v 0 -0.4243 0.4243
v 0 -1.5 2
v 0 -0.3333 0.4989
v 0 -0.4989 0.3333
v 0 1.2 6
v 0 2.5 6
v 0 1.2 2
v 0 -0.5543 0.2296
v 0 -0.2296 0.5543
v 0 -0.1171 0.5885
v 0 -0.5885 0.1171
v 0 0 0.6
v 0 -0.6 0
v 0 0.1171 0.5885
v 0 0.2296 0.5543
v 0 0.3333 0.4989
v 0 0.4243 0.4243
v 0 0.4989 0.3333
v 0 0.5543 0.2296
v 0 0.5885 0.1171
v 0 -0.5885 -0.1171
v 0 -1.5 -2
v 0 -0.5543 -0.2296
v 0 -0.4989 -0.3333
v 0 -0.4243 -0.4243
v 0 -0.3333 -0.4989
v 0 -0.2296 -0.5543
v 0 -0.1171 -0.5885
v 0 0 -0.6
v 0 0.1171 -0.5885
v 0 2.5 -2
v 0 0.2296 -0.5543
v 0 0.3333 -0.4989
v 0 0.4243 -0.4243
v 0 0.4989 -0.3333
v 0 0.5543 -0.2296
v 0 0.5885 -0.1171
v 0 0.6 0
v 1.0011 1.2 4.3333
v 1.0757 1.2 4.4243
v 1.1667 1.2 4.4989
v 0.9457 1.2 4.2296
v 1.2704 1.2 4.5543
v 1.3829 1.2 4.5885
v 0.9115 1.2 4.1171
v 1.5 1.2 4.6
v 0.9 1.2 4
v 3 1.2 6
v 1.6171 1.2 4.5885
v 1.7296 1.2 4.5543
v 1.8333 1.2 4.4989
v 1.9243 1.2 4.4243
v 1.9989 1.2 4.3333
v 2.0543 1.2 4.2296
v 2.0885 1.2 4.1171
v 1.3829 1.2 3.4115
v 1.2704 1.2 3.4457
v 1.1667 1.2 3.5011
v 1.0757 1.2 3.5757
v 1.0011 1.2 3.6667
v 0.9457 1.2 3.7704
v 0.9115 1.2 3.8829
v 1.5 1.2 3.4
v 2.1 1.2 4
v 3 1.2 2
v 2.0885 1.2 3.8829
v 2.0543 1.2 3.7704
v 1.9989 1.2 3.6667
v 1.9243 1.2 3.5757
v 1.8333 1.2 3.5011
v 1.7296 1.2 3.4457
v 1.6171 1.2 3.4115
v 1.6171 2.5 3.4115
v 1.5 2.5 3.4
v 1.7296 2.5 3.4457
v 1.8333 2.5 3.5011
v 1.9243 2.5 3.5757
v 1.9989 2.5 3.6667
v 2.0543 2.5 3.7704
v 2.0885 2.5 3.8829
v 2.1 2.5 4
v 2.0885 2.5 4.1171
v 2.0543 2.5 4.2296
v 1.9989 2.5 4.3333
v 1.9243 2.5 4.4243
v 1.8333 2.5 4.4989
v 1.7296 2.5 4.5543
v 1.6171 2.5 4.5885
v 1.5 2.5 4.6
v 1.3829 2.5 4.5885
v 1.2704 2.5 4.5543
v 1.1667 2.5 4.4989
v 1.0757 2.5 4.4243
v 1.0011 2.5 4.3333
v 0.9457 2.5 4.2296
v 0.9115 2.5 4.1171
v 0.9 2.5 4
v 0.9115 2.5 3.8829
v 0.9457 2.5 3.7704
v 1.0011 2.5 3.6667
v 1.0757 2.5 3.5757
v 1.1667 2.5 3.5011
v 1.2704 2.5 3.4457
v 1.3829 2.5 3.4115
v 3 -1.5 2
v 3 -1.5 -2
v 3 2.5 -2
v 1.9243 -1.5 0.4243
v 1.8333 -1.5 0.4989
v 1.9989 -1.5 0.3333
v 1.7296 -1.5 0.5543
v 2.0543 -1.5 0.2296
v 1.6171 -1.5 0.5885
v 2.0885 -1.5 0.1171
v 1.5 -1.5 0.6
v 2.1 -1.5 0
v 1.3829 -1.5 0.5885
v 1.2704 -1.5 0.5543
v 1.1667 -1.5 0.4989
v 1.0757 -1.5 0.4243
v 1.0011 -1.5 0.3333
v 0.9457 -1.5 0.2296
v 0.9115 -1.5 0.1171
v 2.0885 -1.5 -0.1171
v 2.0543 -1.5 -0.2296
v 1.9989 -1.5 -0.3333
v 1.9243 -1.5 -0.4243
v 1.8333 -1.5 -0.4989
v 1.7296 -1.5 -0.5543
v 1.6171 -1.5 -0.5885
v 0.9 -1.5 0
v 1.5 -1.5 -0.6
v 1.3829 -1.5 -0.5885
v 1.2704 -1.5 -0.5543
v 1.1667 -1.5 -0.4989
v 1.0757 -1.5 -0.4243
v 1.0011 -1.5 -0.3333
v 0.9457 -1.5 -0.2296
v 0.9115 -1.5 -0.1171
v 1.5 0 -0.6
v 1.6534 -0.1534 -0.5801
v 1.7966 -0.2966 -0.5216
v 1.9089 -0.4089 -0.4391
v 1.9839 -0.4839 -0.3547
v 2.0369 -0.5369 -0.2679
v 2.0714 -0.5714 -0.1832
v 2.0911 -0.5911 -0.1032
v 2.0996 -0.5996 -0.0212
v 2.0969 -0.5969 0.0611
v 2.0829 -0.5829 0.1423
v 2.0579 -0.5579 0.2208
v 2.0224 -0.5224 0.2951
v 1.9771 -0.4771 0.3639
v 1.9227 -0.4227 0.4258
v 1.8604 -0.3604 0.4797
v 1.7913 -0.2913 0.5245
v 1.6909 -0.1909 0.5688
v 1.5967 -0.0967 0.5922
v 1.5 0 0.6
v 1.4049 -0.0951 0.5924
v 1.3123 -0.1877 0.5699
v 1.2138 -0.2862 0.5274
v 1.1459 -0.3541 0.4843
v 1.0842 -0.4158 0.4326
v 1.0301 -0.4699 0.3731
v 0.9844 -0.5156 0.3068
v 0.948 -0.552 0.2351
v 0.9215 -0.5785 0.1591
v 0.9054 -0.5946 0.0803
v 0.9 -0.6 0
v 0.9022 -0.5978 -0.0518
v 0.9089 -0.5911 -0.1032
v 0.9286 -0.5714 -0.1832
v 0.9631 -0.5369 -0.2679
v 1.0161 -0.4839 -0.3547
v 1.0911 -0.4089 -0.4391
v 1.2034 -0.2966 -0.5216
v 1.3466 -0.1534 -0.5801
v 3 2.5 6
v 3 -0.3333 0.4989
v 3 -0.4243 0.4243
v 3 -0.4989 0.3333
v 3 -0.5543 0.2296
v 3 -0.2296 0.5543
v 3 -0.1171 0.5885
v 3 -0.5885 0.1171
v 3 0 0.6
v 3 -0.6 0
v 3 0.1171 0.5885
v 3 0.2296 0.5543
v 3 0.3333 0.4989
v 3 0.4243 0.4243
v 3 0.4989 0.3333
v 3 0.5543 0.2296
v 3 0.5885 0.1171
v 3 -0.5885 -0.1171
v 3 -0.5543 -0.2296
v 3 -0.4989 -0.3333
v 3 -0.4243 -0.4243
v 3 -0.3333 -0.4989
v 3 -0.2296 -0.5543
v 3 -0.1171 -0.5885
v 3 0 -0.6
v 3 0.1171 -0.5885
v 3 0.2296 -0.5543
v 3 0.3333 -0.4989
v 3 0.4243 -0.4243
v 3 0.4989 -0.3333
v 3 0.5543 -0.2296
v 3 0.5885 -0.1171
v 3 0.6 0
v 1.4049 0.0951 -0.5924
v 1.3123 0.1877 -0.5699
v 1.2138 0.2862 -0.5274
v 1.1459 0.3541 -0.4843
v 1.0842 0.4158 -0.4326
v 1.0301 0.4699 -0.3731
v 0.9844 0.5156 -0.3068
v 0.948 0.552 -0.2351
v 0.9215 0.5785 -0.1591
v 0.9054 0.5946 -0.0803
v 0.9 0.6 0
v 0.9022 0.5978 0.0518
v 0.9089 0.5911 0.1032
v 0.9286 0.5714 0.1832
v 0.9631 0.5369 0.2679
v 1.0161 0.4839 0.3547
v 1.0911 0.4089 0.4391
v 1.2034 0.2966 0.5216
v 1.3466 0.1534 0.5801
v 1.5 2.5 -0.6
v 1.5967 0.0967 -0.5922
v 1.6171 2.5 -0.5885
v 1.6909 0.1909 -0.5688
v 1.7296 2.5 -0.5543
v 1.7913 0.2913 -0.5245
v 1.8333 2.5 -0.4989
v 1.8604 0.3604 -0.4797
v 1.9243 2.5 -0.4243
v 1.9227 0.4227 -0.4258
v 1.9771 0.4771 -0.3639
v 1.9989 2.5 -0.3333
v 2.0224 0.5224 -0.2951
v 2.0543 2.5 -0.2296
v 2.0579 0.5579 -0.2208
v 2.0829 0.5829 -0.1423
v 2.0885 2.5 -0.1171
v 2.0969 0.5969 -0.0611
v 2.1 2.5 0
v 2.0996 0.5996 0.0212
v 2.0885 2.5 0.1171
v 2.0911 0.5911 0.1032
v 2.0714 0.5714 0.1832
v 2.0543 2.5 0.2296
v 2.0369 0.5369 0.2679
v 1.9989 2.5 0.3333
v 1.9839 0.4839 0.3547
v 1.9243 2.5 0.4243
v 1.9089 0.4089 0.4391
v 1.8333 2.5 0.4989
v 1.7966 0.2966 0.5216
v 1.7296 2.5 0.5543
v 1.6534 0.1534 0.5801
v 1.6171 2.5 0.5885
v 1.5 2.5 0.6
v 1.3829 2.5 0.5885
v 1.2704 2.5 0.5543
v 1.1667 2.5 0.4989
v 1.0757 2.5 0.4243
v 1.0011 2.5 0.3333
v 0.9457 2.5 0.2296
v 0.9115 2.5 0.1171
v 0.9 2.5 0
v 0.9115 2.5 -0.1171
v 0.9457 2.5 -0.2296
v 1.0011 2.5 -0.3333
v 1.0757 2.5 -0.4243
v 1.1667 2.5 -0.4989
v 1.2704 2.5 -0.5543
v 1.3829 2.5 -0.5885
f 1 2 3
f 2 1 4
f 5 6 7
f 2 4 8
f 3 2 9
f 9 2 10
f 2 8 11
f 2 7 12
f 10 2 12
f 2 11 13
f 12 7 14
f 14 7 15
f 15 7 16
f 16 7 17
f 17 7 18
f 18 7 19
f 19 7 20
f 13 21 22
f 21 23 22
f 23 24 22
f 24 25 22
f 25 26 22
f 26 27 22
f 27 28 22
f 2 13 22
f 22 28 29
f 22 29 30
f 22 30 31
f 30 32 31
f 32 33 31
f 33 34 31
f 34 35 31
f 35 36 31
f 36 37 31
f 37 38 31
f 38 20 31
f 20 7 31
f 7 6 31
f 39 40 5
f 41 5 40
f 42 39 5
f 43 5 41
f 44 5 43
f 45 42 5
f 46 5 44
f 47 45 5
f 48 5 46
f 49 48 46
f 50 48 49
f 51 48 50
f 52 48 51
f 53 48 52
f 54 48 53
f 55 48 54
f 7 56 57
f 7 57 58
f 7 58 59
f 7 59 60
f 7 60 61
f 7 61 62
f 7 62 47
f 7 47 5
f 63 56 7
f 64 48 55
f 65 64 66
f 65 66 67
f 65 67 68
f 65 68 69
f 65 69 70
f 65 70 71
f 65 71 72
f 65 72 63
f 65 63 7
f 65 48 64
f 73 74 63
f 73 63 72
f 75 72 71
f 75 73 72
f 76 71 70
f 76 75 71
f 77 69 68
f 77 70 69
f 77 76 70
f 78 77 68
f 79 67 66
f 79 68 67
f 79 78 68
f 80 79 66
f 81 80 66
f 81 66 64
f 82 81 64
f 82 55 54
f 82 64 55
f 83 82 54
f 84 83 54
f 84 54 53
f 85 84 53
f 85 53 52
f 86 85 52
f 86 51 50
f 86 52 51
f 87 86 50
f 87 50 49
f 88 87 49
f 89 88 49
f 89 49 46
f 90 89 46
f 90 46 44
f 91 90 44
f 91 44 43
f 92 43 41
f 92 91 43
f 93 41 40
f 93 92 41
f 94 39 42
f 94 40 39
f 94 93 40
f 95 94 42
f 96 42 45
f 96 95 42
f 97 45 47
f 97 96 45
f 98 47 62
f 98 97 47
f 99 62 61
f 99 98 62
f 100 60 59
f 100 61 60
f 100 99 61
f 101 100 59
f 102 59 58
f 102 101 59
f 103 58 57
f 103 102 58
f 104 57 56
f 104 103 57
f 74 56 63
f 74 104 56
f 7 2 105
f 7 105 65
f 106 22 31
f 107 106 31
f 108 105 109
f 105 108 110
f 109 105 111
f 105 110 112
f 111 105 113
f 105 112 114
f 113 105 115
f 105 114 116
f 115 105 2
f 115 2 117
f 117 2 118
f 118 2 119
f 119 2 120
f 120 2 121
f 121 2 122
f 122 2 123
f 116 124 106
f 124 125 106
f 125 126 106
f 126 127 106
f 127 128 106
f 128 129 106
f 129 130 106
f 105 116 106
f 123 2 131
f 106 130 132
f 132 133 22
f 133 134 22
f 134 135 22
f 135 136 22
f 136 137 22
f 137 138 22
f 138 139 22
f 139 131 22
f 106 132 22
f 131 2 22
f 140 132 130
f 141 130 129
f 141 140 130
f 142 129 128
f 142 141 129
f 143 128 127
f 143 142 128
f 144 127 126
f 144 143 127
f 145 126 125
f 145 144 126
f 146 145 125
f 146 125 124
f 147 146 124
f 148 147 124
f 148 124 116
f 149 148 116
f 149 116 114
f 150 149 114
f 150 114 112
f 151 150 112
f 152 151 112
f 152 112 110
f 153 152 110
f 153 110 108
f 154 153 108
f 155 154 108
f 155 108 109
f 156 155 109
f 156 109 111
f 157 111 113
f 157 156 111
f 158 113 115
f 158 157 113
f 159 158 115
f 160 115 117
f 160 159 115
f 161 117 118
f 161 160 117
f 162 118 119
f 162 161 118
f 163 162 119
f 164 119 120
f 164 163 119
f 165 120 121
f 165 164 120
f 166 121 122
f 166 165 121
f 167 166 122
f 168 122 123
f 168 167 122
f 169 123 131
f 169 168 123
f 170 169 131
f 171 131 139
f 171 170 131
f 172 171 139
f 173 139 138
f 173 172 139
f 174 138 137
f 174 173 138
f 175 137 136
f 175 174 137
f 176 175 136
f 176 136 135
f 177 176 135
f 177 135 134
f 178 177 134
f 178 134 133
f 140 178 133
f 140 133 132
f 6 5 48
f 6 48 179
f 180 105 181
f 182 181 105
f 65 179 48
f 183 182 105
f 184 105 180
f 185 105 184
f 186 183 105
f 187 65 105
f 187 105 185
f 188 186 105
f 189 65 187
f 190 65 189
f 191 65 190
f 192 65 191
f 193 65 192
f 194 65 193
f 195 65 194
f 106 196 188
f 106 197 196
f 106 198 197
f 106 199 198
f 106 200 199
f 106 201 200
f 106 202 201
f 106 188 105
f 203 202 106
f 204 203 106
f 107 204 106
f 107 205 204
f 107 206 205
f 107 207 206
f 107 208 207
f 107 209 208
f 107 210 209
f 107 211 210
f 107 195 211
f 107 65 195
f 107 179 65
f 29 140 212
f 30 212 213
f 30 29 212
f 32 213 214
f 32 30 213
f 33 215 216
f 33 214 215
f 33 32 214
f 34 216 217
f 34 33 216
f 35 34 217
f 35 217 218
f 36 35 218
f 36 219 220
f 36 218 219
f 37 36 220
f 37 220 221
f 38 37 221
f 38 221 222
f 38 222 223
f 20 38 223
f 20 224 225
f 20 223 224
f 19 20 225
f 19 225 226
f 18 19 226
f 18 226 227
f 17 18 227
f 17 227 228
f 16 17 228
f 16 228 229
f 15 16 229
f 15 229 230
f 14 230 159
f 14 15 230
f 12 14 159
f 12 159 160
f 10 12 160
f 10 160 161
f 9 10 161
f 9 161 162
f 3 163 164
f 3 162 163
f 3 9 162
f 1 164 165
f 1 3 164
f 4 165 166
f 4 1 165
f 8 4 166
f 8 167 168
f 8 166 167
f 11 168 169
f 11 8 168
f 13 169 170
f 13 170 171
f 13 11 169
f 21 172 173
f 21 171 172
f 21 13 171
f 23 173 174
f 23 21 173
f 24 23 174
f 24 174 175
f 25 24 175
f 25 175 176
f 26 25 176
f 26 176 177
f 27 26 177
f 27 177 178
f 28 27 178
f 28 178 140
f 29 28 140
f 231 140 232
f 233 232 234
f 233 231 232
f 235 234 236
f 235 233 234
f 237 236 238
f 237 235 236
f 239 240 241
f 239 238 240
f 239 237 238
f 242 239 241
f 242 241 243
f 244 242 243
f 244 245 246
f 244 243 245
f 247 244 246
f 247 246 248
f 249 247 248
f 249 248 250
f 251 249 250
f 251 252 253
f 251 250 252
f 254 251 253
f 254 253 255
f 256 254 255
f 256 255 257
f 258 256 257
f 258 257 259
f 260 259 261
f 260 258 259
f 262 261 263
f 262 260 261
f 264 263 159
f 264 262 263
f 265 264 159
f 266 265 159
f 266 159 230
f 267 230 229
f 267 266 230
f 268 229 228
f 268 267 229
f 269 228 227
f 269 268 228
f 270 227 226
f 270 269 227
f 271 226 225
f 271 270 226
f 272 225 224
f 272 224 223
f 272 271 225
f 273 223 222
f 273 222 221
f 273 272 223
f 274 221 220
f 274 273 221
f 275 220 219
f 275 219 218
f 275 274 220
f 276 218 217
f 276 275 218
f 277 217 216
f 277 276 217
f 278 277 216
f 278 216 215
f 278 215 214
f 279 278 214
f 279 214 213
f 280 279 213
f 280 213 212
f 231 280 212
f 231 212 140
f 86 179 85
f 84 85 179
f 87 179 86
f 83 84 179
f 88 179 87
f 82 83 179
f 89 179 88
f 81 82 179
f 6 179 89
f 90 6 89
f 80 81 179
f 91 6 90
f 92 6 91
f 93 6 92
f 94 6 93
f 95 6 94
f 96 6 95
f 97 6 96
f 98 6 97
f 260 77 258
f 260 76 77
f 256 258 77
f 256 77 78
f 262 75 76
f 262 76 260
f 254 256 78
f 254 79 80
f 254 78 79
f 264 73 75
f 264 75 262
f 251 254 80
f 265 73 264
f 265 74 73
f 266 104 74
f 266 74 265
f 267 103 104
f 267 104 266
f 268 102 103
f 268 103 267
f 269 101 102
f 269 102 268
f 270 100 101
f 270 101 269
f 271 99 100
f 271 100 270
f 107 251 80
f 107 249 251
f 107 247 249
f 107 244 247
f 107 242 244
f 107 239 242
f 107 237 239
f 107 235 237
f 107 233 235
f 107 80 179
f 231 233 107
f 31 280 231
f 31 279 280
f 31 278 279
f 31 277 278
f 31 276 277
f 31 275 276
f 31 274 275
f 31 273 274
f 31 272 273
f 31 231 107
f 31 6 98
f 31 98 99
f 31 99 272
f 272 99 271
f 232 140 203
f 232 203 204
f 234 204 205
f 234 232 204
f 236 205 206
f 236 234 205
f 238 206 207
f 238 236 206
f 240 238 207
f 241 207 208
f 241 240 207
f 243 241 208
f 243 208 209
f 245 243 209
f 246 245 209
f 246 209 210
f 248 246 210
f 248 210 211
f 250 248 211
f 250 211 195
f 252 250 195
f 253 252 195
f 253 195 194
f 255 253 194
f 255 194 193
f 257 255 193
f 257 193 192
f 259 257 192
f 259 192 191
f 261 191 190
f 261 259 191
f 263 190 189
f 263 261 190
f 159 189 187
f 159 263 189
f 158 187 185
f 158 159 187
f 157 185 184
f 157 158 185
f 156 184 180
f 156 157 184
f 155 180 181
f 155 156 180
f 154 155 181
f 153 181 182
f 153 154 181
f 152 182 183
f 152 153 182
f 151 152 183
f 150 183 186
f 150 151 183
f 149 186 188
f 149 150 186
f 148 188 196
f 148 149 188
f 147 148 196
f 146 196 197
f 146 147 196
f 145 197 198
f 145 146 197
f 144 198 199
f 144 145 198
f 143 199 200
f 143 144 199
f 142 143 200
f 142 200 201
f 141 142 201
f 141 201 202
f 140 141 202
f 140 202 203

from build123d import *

# Parameters (mm, degrees)
SKETCH_1_W               = 4
SKETCH_1_H               = 2.5
SKETCH_1_R               = 0.6
SKETCH_1_H_2             = 1.5
EXTRUDE_1_DEPTH          = 3
CUT_EXTRUDE_1_DEPTH      = 8.158910532
CUT_EXTRUDE_1_DEPTH_BACK = 8.158910532
SKETCH_3_R               = 0.6
SKETCH_5_W               = 4
SKETCH_5_H               = 0.2
CUT_EXTRUDE_2_DEPTH      = 8.158910532


with BuildPart() as part:
    # 草图1 → 凸台-拉伸1 (new body)
    # profile 1 of 3: a face of its own
    with BuildSketch(Plane(origin=(0, 0, 0), x_dir=(0, 0, -1), z_dir=(1, 0, 0))):
        with Locations((0, -0.25)):
            Rectangle(SKETCH_1_W, SKETCH_1_H)
        Circle(SKETCH_1_R, mode=Mode.SUBTRACT)
    # profile 2 of 3: a face of its own
    with BuildSketch(Plane(origin=(0, 0, 0), x_dir=(0, 0, -1), z_dir=(1, 0, 0))):
        with Locations((0, 1.75)):
            Rectangle(SKETCH_1_W, SKETCH_1_H_2)
    # profile 3 of 3: a face of its own
    with BuildSketch(Plane(origin=(0, 0, 0), x_dir=(0, 0, -1), z_dir=(1, 0, 0))):
        with Locations((-4, 1.75)):
            Rectangle(SKETCH_1_W, SKETCH_1_H_2)
    extrude(amount=EXTRUDE_1_DEPTH)

    # 草图3 → 切除-拉伸1 (cut, two sides: drawn at the far end of the back side and taken through both)
    with BuildSketch(Plane.XZ.offset(-1).offset(-CUT_EXTRUDE_1_DEPTH_BACK)):
        with Locations(Location((1.5, 4, 0), (0, 0, 270))):
            Circle(SKETCH_3_R)
        with Locations(Location((1.5, 0, 0), (0, 0, 270))):
            Circle(SKETCH_3_R)
    extrude(amount=CUT_EXTRUDE_1_DEPTH + CUT_EXTRUDE_1_DEPTH_BACK, mode=Mode.SUBTRACT)

    # 草图5 → 切除-拉伸2 (cut, through all)
    with BuildSketch(Plane(origin=(3, 0, 0), x_dir=(0, 0, -1), z_dir=(1, 0, 0))):
        with Locations((-4, 1.1)):
            Rectangle(SKETCH_5_W, SKETCH_5_H)
    extrude(amount=-CUT_EXTRUDE_2_DEPTH, mode=Mode.SUBTRACT)


solid = part.part
